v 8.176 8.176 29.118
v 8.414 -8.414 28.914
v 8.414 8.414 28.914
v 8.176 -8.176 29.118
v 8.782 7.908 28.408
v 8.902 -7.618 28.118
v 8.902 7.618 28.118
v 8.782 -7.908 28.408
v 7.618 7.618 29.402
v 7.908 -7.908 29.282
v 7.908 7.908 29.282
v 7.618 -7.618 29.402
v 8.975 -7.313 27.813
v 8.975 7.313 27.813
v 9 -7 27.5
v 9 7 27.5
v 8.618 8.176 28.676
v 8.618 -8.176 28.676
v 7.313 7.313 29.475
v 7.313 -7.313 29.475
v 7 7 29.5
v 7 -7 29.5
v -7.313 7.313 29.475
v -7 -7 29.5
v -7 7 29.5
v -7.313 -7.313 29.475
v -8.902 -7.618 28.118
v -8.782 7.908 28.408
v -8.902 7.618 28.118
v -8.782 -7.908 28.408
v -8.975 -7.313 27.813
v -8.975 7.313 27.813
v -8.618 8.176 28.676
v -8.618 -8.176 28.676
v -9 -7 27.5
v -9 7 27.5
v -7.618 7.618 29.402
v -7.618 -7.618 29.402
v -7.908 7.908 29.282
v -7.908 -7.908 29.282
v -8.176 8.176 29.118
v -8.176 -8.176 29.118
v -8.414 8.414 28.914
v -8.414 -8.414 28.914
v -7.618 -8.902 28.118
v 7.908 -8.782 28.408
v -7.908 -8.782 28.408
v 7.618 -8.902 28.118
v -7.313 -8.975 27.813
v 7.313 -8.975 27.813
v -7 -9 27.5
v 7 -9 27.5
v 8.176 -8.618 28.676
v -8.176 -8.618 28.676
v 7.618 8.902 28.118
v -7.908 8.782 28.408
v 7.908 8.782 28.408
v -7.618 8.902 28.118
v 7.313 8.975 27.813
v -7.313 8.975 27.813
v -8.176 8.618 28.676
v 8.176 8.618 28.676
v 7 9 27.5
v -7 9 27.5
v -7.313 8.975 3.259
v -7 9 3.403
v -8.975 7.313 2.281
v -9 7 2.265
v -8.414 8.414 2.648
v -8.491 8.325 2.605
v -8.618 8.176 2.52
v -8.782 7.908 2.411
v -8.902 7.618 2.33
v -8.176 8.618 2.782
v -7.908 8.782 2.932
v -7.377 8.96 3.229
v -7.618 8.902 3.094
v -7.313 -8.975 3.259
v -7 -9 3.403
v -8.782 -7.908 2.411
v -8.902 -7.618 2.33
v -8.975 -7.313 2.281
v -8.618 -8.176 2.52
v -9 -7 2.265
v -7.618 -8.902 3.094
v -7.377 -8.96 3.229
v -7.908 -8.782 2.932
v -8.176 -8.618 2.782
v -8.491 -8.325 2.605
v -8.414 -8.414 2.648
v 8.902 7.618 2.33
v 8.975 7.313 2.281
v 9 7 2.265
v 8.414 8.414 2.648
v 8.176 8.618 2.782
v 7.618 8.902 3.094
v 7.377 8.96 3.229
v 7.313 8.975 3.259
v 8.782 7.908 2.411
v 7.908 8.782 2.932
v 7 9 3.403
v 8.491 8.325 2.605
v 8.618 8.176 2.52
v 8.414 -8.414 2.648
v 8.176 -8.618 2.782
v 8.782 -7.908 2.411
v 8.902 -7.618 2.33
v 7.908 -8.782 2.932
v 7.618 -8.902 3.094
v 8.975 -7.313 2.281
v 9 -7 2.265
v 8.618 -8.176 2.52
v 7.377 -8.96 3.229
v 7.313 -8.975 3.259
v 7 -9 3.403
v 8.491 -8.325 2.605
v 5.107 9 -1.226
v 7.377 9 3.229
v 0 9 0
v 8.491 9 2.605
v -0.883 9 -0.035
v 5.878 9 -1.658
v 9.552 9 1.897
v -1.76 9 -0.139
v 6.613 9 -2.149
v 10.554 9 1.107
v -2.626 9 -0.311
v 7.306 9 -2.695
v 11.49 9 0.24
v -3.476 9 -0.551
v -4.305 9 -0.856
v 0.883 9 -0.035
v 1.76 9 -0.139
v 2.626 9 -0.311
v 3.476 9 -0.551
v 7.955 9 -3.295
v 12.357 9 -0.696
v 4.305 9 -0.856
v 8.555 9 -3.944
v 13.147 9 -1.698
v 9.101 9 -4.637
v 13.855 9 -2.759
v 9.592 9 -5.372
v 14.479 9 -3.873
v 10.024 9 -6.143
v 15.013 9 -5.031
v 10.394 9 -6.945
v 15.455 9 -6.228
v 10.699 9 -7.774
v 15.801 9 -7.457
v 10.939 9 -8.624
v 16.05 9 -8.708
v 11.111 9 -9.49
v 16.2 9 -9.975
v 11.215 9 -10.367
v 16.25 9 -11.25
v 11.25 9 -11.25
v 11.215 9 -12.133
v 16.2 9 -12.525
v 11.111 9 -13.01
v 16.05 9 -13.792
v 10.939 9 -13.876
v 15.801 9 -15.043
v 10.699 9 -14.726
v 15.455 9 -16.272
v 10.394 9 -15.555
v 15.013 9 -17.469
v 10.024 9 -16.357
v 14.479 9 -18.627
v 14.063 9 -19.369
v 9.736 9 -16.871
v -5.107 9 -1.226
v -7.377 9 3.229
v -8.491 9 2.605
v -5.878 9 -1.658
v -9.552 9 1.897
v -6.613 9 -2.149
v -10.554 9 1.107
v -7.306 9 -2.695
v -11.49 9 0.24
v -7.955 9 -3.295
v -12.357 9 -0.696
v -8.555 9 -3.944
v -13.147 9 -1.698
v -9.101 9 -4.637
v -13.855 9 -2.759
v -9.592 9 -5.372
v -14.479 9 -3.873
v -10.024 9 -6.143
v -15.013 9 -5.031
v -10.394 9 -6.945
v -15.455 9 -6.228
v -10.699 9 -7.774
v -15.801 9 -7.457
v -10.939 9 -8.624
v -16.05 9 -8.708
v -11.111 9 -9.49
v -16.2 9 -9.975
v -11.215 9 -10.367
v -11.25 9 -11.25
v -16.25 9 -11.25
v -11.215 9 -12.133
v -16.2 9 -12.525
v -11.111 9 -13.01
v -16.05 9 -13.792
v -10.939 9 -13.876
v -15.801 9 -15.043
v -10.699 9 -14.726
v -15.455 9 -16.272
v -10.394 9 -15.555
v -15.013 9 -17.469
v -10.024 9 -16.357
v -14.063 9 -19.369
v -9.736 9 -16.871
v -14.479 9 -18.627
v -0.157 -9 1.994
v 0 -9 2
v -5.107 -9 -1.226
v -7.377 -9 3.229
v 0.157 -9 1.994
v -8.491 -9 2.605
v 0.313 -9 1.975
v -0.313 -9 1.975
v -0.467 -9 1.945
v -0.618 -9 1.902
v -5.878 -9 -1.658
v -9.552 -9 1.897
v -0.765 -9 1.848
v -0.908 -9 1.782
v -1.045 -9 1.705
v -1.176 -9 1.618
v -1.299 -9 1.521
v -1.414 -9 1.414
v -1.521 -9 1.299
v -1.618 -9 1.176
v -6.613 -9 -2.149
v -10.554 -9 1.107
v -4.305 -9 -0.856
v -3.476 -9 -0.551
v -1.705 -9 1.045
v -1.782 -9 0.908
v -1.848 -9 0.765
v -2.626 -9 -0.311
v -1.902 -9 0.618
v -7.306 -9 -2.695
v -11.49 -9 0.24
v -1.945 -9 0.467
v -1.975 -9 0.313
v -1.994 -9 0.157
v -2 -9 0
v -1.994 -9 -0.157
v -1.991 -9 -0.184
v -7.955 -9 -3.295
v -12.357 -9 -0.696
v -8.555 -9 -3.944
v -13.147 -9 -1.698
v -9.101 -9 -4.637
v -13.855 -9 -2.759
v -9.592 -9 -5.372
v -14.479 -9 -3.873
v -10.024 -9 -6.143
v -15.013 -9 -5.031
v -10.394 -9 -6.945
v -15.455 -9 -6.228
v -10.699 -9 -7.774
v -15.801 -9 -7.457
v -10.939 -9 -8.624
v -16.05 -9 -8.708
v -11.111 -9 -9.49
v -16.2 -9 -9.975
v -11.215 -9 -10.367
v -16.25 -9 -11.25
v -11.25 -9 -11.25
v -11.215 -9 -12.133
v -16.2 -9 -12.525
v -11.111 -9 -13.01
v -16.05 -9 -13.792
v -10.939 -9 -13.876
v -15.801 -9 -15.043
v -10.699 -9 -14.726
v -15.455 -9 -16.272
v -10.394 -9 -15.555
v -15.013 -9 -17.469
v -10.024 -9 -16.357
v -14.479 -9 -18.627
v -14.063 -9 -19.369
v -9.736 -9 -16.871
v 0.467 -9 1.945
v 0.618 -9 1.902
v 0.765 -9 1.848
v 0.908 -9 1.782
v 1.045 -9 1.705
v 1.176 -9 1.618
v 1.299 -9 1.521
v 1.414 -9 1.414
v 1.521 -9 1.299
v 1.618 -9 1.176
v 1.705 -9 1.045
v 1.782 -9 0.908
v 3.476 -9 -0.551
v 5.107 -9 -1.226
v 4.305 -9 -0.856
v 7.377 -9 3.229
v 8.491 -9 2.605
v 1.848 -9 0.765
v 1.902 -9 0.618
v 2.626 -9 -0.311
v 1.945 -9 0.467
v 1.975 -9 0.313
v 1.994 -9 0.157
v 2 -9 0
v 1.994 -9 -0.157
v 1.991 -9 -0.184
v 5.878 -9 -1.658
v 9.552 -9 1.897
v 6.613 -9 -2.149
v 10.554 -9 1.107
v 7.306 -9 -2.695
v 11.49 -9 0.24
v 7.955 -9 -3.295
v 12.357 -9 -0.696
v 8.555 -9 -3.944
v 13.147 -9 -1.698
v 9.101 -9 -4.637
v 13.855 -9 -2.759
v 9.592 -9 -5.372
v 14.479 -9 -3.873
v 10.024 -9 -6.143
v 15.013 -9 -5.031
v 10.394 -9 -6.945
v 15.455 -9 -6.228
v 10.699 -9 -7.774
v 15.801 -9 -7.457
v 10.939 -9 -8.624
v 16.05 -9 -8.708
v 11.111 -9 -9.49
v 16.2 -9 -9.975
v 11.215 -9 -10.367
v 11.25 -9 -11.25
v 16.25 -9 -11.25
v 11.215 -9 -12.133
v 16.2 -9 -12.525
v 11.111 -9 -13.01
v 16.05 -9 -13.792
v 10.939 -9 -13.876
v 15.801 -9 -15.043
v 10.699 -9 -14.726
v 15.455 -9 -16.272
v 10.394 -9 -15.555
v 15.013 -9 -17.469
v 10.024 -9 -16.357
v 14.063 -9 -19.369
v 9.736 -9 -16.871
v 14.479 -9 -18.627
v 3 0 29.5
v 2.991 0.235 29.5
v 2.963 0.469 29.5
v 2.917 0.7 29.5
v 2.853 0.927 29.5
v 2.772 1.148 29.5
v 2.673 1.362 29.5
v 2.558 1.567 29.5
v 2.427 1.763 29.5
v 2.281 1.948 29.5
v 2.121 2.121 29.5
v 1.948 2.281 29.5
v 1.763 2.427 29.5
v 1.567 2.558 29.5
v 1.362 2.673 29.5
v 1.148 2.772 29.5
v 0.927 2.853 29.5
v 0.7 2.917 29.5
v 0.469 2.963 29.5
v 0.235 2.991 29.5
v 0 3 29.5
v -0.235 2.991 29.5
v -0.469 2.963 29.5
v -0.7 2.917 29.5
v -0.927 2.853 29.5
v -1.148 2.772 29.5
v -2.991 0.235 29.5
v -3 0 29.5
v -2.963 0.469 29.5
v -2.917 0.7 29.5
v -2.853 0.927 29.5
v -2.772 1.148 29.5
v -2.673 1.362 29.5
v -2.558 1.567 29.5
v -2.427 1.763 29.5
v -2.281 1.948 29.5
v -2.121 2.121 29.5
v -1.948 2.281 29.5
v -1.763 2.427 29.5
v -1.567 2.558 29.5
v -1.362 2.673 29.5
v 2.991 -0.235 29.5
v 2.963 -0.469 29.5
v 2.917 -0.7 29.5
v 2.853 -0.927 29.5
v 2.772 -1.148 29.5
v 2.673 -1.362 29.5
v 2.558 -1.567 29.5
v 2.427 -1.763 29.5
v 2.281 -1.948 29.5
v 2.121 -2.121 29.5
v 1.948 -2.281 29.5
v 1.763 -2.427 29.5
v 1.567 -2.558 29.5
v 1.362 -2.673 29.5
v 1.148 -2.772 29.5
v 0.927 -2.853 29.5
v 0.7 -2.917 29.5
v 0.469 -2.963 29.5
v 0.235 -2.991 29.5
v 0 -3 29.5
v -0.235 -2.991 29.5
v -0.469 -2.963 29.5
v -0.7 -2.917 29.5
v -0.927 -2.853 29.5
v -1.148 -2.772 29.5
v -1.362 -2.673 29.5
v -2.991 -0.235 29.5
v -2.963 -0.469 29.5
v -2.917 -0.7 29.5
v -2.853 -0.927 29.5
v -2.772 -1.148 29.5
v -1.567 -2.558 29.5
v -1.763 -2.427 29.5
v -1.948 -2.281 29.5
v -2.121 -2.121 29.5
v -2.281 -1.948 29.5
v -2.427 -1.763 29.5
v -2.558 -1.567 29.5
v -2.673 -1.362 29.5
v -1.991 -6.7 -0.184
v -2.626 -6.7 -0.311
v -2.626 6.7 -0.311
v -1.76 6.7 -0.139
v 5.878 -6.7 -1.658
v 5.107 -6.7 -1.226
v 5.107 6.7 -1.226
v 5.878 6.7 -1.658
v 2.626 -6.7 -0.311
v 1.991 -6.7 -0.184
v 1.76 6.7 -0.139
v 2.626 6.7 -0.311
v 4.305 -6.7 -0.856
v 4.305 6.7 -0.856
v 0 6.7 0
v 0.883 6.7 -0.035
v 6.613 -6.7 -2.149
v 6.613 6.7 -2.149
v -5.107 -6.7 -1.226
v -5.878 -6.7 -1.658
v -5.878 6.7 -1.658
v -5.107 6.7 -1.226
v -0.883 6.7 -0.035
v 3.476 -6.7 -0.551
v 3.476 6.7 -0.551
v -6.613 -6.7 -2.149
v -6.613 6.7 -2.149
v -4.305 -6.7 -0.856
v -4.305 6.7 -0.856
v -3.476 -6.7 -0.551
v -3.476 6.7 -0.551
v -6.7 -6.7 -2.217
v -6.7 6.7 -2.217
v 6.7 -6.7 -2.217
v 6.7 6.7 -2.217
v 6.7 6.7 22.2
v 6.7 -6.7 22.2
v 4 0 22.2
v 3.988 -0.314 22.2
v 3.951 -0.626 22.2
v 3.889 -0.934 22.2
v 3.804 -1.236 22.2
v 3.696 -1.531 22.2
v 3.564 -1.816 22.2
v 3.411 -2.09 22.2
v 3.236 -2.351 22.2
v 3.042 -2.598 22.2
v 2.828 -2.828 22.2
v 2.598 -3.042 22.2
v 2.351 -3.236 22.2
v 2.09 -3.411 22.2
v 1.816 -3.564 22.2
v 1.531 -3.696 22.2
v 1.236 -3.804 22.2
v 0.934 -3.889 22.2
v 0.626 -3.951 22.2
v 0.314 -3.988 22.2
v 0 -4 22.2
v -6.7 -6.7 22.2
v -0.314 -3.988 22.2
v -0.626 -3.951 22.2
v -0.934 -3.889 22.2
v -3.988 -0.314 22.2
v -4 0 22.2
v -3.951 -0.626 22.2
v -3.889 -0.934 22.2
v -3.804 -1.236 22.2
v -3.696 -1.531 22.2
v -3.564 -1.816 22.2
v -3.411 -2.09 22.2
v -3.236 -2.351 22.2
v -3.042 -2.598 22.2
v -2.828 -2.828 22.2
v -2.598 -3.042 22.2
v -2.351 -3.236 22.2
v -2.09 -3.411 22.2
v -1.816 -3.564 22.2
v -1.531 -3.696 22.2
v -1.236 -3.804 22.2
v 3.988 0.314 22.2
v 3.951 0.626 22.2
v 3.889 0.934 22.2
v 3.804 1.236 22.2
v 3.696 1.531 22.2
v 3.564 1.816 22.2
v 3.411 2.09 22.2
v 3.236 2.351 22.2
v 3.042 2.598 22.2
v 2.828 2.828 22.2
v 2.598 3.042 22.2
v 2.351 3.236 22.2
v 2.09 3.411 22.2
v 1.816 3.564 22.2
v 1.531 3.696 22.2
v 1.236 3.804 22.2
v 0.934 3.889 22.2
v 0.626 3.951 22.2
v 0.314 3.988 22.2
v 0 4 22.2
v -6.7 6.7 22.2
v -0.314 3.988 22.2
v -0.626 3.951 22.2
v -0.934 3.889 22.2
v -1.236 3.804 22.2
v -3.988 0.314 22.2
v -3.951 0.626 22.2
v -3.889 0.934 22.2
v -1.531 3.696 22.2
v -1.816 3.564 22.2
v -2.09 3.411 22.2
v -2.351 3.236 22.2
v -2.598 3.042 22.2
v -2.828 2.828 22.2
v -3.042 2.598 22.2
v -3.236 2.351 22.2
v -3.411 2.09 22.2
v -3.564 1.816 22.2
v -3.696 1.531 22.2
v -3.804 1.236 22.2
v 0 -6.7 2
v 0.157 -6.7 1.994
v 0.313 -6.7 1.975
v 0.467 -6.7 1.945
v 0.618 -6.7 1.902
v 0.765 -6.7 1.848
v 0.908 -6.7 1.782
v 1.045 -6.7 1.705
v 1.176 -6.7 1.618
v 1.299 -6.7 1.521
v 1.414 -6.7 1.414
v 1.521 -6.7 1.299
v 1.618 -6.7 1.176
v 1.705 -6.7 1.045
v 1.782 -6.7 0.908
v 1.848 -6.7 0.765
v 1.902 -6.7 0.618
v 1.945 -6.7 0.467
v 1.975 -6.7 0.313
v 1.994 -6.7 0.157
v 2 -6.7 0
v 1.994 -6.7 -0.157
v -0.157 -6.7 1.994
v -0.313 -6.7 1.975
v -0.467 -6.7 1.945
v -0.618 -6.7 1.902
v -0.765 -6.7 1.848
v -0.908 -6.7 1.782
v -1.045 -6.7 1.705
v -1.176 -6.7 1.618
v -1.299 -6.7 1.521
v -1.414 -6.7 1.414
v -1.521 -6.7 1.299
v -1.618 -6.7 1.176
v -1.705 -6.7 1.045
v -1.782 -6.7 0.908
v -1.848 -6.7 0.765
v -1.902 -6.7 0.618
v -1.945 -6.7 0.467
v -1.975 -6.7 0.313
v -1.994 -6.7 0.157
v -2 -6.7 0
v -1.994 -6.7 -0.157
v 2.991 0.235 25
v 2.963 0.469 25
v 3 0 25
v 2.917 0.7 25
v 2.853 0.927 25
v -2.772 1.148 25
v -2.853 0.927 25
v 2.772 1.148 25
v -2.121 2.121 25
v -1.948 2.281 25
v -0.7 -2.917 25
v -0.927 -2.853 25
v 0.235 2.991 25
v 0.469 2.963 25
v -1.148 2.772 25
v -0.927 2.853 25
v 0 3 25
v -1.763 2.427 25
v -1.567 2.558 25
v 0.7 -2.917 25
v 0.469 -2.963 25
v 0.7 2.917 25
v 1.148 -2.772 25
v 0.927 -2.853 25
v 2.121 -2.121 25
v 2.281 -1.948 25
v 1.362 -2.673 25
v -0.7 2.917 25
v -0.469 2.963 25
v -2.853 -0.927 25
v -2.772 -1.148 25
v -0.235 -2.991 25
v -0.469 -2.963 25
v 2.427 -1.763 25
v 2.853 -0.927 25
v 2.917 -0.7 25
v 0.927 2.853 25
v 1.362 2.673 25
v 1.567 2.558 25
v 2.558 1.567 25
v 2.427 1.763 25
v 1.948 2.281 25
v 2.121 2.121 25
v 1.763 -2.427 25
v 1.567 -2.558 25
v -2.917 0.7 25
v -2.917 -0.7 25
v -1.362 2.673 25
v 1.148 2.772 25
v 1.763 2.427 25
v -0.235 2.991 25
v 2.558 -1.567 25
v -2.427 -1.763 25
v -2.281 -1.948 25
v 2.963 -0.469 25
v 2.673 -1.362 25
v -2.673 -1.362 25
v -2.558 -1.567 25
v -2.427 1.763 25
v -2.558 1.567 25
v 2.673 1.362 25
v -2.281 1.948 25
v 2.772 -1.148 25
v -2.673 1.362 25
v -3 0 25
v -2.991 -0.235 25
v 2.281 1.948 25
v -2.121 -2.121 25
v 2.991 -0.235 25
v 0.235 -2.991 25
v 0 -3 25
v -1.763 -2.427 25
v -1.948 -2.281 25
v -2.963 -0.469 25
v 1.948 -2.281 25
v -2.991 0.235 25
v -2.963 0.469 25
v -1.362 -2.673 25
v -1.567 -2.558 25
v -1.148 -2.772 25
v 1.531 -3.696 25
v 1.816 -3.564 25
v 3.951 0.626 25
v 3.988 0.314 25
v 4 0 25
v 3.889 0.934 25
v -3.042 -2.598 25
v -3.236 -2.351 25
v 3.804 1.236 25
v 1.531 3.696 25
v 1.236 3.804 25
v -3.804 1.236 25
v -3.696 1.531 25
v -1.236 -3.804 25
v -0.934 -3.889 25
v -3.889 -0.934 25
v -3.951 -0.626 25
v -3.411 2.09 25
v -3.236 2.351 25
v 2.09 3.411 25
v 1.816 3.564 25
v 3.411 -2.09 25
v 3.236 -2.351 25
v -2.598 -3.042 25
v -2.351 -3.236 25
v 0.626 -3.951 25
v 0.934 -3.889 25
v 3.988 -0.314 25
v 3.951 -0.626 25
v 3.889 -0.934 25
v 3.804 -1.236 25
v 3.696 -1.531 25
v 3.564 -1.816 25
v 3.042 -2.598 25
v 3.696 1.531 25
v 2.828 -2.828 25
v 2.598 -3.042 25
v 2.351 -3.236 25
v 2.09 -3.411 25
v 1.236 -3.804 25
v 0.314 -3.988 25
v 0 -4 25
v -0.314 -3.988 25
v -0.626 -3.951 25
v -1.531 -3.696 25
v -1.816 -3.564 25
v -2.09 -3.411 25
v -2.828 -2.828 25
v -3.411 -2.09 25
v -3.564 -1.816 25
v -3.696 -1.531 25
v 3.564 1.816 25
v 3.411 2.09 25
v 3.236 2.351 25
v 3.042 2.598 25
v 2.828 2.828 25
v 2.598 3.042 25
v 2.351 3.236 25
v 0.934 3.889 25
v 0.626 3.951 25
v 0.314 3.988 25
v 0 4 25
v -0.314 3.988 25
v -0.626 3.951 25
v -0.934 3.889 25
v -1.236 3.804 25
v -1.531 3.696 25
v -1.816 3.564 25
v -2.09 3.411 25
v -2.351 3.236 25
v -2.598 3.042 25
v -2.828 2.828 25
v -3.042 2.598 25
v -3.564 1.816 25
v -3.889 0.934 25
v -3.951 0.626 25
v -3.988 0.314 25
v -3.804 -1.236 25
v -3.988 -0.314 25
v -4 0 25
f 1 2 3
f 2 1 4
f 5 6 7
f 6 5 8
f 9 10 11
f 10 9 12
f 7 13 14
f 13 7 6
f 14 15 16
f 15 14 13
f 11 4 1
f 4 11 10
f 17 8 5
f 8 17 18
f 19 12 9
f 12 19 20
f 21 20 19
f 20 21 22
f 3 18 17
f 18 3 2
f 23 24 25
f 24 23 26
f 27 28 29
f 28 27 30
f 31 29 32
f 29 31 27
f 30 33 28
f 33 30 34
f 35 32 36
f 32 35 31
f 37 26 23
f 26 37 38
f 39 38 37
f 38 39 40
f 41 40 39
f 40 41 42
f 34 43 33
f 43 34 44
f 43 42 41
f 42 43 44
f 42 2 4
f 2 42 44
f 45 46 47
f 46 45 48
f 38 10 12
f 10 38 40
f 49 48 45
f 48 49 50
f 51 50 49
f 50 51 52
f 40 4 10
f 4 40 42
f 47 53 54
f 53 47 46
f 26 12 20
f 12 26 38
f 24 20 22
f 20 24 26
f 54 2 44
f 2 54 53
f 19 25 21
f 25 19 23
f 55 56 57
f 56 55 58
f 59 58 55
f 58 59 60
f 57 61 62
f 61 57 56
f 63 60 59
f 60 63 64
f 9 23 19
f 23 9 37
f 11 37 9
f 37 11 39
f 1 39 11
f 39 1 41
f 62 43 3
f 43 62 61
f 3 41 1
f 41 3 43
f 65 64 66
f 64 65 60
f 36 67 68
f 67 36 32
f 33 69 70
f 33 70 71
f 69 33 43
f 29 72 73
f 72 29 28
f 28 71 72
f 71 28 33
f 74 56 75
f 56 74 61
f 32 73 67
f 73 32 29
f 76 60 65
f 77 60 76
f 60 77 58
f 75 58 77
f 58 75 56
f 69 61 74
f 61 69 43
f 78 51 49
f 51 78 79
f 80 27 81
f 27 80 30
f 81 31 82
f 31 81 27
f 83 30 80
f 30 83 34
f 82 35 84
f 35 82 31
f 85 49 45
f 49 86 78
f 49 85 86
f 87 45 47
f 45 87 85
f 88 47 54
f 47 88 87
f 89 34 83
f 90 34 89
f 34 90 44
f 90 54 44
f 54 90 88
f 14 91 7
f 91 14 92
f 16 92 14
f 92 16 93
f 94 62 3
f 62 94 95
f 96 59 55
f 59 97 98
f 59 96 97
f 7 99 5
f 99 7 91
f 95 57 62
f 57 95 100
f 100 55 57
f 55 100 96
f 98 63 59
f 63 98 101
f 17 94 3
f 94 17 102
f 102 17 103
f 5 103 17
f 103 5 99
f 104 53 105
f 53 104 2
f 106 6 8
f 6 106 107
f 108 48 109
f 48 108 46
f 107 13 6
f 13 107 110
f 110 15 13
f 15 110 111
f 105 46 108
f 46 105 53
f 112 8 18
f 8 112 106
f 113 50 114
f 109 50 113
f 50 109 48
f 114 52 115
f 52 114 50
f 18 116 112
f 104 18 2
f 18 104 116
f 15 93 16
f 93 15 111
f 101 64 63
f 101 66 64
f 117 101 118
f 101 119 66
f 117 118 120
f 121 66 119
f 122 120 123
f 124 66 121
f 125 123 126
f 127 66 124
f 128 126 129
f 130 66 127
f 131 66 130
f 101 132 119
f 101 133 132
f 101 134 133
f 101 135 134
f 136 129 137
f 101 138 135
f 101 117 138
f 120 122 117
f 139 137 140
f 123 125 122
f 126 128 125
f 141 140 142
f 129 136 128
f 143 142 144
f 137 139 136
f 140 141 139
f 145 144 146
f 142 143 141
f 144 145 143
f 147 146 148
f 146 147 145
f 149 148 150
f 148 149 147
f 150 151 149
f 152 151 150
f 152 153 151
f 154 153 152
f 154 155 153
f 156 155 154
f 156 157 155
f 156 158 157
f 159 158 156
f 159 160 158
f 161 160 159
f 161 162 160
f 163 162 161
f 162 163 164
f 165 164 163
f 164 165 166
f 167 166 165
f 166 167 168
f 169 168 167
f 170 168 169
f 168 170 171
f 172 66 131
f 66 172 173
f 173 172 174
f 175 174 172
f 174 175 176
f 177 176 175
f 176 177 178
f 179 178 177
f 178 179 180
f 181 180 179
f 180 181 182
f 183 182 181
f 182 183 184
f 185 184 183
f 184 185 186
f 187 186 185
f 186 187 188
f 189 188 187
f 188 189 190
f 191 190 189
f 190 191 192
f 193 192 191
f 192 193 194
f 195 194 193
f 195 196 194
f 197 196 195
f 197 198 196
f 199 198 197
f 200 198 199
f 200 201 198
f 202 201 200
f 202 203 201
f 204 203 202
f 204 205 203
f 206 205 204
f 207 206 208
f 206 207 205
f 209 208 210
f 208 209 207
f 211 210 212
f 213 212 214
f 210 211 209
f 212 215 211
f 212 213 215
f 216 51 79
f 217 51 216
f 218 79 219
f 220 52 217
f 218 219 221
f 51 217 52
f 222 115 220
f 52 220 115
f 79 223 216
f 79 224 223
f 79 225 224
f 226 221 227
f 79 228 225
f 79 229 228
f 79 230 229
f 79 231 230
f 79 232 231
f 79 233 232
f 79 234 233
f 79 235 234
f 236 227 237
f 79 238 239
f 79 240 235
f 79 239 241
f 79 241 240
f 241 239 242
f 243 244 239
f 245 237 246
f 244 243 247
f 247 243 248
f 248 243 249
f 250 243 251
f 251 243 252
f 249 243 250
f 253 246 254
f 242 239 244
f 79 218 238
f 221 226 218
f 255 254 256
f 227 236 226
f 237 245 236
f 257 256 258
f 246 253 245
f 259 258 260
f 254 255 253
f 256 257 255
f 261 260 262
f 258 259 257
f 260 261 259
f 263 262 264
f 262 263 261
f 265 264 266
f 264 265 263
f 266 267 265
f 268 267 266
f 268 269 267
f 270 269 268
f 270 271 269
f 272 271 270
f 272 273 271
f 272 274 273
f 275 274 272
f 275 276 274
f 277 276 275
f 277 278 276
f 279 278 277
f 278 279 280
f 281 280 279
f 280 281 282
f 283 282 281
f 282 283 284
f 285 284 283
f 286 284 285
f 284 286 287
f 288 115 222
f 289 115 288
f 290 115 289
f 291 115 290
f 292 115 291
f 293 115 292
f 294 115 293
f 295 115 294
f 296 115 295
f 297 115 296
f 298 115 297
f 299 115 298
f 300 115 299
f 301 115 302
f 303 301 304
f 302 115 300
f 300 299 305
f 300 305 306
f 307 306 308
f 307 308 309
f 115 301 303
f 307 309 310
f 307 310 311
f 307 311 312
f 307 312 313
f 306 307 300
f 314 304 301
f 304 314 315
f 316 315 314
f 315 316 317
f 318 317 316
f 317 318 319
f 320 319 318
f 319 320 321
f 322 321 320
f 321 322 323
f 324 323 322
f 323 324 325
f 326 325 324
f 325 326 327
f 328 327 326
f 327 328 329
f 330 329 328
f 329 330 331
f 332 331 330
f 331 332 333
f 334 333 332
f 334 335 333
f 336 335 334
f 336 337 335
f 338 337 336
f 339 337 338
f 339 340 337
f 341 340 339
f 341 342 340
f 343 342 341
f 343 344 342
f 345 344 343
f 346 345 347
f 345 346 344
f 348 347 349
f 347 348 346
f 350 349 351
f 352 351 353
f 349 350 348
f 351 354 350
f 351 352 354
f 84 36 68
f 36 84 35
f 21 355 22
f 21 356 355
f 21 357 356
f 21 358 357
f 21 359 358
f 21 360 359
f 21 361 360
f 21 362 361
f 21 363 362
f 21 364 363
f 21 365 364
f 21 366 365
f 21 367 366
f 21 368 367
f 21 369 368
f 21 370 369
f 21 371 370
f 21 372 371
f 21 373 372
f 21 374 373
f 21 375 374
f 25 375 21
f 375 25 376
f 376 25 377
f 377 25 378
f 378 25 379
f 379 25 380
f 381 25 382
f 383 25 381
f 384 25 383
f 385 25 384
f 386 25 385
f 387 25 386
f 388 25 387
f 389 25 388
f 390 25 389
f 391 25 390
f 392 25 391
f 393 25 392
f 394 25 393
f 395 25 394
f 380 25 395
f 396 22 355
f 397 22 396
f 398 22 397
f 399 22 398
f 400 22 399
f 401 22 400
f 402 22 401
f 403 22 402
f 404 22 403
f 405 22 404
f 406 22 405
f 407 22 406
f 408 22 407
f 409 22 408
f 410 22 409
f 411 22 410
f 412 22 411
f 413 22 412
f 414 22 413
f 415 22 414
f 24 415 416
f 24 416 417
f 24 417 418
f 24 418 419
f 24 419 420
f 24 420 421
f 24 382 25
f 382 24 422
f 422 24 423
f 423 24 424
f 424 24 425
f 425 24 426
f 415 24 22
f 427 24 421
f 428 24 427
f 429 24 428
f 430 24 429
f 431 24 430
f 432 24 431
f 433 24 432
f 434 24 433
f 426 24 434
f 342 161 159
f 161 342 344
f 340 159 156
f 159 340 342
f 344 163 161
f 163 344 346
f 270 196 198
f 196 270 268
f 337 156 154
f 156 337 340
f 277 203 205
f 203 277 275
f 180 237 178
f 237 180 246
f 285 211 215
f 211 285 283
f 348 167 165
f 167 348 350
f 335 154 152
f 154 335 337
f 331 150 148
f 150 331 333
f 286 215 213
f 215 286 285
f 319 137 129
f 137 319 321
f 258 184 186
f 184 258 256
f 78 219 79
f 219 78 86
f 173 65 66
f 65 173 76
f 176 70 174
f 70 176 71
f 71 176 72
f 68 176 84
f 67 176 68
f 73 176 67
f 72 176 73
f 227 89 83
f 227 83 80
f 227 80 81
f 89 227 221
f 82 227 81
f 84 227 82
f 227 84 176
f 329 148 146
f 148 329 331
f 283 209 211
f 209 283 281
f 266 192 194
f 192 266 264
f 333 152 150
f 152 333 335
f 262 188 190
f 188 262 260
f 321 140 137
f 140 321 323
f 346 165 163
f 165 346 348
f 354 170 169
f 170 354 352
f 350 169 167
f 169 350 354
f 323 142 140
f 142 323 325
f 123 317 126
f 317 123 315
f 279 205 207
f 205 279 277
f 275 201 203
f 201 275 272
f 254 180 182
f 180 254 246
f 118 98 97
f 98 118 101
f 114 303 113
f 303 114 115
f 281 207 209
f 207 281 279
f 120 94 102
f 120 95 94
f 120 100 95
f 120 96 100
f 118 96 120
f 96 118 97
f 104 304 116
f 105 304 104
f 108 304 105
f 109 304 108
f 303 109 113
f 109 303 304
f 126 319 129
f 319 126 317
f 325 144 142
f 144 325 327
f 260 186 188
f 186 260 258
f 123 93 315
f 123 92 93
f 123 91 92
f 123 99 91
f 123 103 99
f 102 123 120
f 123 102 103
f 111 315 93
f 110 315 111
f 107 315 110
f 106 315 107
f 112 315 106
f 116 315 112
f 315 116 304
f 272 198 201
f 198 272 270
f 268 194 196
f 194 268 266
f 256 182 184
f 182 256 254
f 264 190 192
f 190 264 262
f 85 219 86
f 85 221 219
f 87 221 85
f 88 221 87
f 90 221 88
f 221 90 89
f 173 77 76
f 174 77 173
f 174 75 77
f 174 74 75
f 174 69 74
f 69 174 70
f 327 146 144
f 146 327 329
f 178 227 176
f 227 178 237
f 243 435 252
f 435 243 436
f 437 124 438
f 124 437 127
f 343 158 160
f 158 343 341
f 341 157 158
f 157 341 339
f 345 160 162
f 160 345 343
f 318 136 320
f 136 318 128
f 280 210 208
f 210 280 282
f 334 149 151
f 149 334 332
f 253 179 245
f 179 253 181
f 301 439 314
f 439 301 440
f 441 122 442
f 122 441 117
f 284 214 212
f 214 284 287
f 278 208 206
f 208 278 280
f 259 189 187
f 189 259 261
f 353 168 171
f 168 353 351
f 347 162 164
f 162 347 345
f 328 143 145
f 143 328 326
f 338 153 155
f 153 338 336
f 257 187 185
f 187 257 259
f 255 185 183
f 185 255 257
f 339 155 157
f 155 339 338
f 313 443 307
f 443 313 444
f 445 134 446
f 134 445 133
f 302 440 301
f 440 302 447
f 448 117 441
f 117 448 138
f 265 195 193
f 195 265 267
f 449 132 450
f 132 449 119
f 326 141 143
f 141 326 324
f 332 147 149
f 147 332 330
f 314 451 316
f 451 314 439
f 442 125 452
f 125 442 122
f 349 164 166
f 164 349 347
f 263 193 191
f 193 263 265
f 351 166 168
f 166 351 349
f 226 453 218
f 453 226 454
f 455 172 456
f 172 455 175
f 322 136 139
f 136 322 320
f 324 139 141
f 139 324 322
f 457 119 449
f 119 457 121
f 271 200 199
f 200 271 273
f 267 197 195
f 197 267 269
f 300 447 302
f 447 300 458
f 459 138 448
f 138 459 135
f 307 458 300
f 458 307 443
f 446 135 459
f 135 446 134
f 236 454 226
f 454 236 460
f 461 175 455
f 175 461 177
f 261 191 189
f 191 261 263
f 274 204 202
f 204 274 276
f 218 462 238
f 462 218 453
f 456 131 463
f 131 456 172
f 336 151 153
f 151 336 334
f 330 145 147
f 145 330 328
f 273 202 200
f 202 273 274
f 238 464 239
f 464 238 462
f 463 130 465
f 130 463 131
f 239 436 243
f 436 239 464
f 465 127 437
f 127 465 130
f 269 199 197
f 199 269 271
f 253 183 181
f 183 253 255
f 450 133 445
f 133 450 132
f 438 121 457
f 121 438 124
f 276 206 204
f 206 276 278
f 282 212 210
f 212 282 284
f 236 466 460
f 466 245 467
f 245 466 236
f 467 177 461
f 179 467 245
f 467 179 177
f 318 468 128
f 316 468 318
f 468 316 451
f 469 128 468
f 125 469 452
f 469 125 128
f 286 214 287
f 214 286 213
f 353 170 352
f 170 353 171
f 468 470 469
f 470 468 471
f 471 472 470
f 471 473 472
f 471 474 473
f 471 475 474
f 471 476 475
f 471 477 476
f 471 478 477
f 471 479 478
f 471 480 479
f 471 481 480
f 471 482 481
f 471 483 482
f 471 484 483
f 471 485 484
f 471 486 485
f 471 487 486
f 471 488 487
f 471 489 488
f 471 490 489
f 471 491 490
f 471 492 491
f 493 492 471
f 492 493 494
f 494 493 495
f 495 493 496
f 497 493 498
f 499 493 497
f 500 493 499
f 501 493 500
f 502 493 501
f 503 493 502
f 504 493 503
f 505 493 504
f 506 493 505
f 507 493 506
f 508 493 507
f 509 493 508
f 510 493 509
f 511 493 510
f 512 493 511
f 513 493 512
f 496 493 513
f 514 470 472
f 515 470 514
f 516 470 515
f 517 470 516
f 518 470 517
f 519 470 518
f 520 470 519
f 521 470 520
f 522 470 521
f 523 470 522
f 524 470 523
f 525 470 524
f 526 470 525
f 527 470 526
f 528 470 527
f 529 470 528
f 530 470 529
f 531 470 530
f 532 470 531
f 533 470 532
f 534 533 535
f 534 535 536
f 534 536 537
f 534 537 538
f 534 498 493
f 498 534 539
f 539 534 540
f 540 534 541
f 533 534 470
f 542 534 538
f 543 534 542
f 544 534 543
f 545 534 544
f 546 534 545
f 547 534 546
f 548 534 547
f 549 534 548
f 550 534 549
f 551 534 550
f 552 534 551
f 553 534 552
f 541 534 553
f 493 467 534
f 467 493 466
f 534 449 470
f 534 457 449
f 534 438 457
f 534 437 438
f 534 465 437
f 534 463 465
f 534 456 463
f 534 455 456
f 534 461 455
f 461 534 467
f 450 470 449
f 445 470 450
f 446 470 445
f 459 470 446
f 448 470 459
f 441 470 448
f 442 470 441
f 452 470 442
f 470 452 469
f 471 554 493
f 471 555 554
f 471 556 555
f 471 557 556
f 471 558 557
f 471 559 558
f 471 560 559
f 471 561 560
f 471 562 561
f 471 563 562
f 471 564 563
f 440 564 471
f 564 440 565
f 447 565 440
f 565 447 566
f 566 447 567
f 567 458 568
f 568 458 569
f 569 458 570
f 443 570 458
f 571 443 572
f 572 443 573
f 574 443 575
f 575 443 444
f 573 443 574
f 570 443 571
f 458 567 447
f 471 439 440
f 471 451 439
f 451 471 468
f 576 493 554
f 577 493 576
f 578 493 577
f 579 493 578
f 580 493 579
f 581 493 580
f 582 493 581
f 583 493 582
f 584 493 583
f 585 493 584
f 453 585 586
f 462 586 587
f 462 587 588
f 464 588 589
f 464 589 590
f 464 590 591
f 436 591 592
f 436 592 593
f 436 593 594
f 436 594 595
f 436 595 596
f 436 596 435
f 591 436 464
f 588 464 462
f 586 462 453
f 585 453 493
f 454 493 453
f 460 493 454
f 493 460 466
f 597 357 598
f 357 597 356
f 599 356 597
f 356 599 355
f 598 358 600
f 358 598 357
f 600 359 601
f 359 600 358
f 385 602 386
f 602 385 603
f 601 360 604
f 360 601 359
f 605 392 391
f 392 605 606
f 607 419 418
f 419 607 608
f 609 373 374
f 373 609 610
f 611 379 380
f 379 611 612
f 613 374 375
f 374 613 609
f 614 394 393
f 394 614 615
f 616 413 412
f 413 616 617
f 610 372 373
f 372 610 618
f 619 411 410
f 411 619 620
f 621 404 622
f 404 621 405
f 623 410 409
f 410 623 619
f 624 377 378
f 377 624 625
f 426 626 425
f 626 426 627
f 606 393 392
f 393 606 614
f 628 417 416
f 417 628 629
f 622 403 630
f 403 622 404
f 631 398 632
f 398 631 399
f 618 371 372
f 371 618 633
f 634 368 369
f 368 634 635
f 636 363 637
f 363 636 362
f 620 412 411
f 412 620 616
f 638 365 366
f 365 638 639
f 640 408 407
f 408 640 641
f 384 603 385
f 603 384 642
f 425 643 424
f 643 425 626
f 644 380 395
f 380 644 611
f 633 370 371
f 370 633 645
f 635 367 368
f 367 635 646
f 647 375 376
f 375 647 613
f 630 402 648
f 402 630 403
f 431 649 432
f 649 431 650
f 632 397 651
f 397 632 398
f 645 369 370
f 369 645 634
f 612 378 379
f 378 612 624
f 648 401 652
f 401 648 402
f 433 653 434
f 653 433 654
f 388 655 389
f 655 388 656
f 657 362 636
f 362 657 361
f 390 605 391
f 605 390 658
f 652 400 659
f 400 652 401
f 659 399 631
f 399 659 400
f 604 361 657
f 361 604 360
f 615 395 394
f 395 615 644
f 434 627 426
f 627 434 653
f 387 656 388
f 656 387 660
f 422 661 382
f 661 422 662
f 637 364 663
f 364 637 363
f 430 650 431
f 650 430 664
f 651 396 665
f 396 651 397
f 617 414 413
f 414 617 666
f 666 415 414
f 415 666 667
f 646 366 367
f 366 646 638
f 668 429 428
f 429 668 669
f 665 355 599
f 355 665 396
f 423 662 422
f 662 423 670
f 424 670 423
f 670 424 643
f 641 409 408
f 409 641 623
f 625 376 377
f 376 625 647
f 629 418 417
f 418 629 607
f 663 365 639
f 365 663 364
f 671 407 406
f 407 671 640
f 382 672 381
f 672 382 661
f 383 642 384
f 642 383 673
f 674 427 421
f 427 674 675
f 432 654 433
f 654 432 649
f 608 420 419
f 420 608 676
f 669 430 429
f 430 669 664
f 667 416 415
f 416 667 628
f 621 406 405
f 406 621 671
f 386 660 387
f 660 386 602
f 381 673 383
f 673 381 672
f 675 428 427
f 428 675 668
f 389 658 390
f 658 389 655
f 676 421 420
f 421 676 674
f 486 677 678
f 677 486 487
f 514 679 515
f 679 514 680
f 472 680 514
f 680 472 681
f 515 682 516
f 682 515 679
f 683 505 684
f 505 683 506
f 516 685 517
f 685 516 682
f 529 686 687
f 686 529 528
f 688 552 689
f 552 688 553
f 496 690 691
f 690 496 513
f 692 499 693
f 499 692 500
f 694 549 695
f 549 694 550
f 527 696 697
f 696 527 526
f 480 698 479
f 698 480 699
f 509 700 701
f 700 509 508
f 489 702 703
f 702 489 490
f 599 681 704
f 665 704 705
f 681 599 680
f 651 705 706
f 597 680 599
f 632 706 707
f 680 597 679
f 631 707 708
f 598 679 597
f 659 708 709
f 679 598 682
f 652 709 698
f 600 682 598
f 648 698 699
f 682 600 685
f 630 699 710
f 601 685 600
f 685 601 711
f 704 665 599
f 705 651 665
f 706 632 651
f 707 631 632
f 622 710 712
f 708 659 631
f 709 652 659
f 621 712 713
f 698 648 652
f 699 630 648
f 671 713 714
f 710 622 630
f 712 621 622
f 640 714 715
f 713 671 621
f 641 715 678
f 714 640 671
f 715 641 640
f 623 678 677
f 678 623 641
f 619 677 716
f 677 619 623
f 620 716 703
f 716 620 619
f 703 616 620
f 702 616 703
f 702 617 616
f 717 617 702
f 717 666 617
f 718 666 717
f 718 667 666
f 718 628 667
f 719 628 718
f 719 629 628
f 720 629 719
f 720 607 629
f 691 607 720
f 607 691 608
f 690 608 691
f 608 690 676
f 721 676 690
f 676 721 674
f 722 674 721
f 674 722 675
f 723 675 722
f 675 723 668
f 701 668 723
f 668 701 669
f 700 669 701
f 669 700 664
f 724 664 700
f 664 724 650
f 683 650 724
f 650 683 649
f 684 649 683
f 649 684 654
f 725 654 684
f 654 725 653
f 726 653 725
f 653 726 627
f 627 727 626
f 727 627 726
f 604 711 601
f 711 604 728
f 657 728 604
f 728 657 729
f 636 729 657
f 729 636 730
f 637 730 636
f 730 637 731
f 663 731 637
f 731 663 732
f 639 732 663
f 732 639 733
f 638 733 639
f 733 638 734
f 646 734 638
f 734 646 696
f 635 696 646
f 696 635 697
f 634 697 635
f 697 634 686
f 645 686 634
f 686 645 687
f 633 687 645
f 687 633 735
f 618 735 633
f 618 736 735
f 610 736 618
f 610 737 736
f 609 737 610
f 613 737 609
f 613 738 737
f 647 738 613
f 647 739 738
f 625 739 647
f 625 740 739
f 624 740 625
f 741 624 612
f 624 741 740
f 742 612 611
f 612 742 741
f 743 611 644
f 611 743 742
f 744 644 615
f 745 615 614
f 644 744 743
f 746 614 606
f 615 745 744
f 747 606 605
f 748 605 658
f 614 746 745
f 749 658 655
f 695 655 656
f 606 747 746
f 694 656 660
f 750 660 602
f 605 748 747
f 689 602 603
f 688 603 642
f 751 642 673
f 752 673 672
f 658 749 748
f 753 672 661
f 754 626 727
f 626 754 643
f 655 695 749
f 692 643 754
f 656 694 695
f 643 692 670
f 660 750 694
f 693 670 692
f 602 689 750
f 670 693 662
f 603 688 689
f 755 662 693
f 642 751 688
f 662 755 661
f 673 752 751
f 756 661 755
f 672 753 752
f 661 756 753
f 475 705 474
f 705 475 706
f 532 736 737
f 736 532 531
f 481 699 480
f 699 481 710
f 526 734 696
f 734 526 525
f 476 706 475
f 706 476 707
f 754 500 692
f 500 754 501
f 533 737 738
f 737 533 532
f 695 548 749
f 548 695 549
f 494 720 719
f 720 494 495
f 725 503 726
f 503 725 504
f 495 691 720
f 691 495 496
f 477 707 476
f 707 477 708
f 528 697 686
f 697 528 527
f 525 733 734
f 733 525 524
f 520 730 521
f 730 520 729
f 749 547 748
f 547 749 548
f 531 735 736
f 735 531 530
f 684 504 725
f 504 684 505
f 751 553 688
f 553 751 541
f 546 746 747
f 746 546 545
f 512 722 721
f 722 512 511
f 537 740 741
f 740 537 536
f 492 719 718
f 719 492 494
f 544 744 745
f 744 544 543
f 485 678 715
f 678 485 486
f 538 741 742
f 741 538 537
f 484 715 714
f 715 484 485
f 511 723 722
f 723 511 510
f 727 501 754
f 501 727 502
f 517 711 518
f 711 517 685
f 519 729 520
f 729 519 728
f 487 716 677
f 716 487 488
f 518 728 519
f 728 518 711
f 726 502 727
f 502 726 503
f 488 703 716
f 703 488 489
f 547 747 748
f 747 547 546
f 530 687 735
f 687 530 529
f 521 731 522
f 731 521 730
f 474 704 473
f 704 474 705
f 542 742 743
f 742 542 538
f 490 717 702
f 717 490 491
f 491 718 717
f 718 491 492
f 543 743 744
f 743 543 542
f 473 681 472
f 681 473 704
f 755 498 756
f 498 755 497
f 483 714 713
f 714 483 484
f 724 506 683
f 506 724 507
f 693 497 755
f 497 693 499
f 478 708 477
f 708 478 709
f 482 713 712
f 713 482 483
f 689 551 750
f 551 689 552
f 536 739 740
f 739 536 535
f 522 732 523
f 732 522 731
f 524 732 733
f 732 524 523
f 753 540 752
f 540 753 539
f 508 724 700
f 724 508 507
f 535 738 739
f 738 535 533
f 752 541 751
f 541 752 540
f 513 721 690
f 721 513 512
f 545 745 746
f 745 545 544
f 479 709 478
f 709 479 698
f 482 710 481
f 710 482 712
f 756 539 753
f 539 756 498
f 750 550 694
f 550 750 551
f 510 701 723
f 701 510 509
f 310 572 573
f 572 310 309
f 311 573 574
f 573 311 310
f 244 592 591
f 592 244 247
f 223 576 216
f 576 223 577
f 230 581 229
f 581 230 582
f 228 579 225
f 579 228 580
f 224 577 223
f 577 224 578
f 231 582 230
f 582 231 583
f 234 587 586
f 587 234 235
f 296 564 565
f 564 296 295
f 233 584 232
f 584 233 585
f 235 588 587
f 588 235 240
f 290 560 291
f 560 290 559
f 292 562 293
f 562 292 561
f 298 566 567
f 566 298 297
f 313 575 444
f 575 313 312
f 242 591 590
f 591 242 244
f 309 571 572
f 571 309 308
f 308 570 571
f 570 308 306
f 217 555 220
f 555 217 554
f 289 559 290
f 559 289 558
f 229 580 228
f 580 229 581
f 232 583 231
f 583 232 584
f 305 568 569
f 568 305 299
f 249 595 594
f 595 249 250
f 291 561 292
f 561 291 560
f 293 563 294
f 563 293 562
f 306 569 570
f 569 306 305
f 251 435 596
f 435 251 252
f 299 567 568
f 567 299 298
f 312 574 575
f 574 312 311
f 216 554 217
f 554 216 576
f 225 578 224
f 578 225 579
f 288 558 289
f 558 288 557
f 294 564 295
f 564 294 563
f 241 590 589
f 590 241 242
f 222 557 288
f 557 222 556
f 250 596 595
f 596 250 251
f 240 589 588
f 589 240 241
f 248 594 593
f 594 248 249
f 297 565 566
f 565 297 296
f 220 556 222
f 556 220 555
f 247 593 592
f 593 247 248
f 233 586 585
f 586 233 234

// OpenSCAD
lx = 13;
ly = 13;
lz = 22;
thickness = 2.5;
hole_d = 6;
hole_h = 7.5;
hole2_d = 8;
hole2_h = 3;
gap = 0.2;
wire_d = 4;
fillet=2.0;

// handlebar interface
d_handlebar = 22.5;
w_handlebar = ly + 2*thickness;
t_handlebar = 5;
// opening angle
theta = 60;

$fn = 80;

module Fillet(r) {
    difference() {
        linear_extrude(10*lz, center=true) square(2*r, center=true);
        union() {
            translate([r, r, 0])
            linear_extrude(12*lz, center=true)
            circle(r, $fn=40);
            translate([r, -r, 0])
            linear_extrude(12*lz, center=true)
            circle(r, $fn=40);
            translate([-r, -r, 0])
            linear_extrude(12*lz, center=true)
            circle(r, $fn=40);
            translate([-r, r, 0])
            linear_extrude(12*lz, center=true)
            circle(r, $fn=40);
        }
    }
};

module Holder() {
    translate([0, 0, 0])
    rotate([-90, 0, 0])
    difference() {
        union() {
            difference() {
                cube_h = d_handlebar/2 + lz + hole_h;
                translate([0, -cube_h/2+d_handlebar/2, 0])
                cube([lx+2*thickness, cube_h, w_handlebar], center=true);
                translate([ly/2 + thickness, -cube_h+d_handlebar/2, 0])
                Fillet(fillet);
                translate([-ly/2 - thickness, -cube_h+d_handlebar/2, 0])
                Fillet(fillet);
                rotate([0, 90, 0])
                translate([lx/2 + thickness, -cube_h+d_handlebar/2, 0])
                Fillet(fillet);
                rotate([0, 90, 0])
                translate([-lx/2 - thickness, -cube_h+d_handlebar/2, 0])
                Fillet(fillet);
                rotate([90, 0, 0])
                translate([-lx/2 - thickness, ly/2+thickness, 0])
                Fillet(fillet);
                rotate([90, 0, 0])
                translate([-lx/2 - thickness, -ly/2-thickness, 0])
                Fillet(fillet);
                rotate([90, 0, 0])
                translate([lx/2 + thickness, ly/2+thickness, 0])
                Fillet(fillet);
                rotate([90, 0, 0])
                translate([lx/2 + thickness, -ly/2-thickness, 0])
                Fillet(fillet);
            }
            translate([0, d_handlebar/2, 0])
            cylinder(d=d_handlebar+2*t_handlebar, h=w_handlebar, center=true, $fn=80);
        }
        translate([0, d_handlebar/2, 0]) {
            cylinder(d=d_handlebar, h=3*lz, center=true, $fn=80);
            linear_extrude(3*lz, center=true)
            polygon([
                [0, 0],
                [-2*w_handlebar*tan(theta), 2*w_handlebar],
                [2*w_handlebar*tan(theta), 2*w_handlebar]
            ]);
        }
    }
}

module SwitchHole() {
    translate([0, 0, 0])
    cube([lx+2*gap, ly+2*gap, 2*lz+2*gap], center = true);
    cylinder(d=hole_d, h=5*lz);
    translate([0, 0, lz])
    cylinder(d=hole2_d, h=hole2_h);
}

module WireHole() {
    rotate([90, 0, 0])
    cylinder(d=wire_d, h=3*ly);
}

module Full() {
    difference() {
        Holder();
        SwitchHole();
        WireHole();
    }
}

Full();
